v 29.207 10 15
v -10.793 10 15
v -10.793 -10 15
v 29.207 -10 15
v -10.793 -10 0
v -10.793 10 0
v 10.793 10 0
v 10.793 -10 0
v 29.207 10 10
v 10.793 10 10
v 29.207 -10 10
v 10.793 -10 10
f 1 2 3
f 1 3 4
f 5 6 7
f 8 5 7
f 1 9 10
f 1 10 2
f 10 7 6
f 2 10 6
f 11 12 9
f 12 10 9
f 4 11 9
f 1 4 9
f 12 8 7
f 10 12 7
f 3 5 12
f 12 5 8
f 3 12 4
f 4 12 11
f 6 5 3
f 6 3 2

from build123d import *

# Parameters (mm, degrees)
F0_W     = 21.585796
F0_H     = 20
F1_DEPTH = 10
F2_W     = 18.414204
F2_H     = 20
F2_W_2   = 21.585796
F3_DEPTH = 5


with BuildPart() as f1:
    # F0 (on Top) → F1 (new body)
    with BuildSketch(Plane.XY):
        Rectangle(F0_W, F0_H)
    extrude(amount=F1_DEPTH)

    # F2 (on face) → F3 (join)
    with BuildSketch(Plane.XY.offset(10)):
        with Locations((20, 0)):
            Rectangle(F2_W, F2_H)
        Rectangle(F2_W_2, F2_H)
    extrude(amount=F3_DEPTH)


solid = f1.part
